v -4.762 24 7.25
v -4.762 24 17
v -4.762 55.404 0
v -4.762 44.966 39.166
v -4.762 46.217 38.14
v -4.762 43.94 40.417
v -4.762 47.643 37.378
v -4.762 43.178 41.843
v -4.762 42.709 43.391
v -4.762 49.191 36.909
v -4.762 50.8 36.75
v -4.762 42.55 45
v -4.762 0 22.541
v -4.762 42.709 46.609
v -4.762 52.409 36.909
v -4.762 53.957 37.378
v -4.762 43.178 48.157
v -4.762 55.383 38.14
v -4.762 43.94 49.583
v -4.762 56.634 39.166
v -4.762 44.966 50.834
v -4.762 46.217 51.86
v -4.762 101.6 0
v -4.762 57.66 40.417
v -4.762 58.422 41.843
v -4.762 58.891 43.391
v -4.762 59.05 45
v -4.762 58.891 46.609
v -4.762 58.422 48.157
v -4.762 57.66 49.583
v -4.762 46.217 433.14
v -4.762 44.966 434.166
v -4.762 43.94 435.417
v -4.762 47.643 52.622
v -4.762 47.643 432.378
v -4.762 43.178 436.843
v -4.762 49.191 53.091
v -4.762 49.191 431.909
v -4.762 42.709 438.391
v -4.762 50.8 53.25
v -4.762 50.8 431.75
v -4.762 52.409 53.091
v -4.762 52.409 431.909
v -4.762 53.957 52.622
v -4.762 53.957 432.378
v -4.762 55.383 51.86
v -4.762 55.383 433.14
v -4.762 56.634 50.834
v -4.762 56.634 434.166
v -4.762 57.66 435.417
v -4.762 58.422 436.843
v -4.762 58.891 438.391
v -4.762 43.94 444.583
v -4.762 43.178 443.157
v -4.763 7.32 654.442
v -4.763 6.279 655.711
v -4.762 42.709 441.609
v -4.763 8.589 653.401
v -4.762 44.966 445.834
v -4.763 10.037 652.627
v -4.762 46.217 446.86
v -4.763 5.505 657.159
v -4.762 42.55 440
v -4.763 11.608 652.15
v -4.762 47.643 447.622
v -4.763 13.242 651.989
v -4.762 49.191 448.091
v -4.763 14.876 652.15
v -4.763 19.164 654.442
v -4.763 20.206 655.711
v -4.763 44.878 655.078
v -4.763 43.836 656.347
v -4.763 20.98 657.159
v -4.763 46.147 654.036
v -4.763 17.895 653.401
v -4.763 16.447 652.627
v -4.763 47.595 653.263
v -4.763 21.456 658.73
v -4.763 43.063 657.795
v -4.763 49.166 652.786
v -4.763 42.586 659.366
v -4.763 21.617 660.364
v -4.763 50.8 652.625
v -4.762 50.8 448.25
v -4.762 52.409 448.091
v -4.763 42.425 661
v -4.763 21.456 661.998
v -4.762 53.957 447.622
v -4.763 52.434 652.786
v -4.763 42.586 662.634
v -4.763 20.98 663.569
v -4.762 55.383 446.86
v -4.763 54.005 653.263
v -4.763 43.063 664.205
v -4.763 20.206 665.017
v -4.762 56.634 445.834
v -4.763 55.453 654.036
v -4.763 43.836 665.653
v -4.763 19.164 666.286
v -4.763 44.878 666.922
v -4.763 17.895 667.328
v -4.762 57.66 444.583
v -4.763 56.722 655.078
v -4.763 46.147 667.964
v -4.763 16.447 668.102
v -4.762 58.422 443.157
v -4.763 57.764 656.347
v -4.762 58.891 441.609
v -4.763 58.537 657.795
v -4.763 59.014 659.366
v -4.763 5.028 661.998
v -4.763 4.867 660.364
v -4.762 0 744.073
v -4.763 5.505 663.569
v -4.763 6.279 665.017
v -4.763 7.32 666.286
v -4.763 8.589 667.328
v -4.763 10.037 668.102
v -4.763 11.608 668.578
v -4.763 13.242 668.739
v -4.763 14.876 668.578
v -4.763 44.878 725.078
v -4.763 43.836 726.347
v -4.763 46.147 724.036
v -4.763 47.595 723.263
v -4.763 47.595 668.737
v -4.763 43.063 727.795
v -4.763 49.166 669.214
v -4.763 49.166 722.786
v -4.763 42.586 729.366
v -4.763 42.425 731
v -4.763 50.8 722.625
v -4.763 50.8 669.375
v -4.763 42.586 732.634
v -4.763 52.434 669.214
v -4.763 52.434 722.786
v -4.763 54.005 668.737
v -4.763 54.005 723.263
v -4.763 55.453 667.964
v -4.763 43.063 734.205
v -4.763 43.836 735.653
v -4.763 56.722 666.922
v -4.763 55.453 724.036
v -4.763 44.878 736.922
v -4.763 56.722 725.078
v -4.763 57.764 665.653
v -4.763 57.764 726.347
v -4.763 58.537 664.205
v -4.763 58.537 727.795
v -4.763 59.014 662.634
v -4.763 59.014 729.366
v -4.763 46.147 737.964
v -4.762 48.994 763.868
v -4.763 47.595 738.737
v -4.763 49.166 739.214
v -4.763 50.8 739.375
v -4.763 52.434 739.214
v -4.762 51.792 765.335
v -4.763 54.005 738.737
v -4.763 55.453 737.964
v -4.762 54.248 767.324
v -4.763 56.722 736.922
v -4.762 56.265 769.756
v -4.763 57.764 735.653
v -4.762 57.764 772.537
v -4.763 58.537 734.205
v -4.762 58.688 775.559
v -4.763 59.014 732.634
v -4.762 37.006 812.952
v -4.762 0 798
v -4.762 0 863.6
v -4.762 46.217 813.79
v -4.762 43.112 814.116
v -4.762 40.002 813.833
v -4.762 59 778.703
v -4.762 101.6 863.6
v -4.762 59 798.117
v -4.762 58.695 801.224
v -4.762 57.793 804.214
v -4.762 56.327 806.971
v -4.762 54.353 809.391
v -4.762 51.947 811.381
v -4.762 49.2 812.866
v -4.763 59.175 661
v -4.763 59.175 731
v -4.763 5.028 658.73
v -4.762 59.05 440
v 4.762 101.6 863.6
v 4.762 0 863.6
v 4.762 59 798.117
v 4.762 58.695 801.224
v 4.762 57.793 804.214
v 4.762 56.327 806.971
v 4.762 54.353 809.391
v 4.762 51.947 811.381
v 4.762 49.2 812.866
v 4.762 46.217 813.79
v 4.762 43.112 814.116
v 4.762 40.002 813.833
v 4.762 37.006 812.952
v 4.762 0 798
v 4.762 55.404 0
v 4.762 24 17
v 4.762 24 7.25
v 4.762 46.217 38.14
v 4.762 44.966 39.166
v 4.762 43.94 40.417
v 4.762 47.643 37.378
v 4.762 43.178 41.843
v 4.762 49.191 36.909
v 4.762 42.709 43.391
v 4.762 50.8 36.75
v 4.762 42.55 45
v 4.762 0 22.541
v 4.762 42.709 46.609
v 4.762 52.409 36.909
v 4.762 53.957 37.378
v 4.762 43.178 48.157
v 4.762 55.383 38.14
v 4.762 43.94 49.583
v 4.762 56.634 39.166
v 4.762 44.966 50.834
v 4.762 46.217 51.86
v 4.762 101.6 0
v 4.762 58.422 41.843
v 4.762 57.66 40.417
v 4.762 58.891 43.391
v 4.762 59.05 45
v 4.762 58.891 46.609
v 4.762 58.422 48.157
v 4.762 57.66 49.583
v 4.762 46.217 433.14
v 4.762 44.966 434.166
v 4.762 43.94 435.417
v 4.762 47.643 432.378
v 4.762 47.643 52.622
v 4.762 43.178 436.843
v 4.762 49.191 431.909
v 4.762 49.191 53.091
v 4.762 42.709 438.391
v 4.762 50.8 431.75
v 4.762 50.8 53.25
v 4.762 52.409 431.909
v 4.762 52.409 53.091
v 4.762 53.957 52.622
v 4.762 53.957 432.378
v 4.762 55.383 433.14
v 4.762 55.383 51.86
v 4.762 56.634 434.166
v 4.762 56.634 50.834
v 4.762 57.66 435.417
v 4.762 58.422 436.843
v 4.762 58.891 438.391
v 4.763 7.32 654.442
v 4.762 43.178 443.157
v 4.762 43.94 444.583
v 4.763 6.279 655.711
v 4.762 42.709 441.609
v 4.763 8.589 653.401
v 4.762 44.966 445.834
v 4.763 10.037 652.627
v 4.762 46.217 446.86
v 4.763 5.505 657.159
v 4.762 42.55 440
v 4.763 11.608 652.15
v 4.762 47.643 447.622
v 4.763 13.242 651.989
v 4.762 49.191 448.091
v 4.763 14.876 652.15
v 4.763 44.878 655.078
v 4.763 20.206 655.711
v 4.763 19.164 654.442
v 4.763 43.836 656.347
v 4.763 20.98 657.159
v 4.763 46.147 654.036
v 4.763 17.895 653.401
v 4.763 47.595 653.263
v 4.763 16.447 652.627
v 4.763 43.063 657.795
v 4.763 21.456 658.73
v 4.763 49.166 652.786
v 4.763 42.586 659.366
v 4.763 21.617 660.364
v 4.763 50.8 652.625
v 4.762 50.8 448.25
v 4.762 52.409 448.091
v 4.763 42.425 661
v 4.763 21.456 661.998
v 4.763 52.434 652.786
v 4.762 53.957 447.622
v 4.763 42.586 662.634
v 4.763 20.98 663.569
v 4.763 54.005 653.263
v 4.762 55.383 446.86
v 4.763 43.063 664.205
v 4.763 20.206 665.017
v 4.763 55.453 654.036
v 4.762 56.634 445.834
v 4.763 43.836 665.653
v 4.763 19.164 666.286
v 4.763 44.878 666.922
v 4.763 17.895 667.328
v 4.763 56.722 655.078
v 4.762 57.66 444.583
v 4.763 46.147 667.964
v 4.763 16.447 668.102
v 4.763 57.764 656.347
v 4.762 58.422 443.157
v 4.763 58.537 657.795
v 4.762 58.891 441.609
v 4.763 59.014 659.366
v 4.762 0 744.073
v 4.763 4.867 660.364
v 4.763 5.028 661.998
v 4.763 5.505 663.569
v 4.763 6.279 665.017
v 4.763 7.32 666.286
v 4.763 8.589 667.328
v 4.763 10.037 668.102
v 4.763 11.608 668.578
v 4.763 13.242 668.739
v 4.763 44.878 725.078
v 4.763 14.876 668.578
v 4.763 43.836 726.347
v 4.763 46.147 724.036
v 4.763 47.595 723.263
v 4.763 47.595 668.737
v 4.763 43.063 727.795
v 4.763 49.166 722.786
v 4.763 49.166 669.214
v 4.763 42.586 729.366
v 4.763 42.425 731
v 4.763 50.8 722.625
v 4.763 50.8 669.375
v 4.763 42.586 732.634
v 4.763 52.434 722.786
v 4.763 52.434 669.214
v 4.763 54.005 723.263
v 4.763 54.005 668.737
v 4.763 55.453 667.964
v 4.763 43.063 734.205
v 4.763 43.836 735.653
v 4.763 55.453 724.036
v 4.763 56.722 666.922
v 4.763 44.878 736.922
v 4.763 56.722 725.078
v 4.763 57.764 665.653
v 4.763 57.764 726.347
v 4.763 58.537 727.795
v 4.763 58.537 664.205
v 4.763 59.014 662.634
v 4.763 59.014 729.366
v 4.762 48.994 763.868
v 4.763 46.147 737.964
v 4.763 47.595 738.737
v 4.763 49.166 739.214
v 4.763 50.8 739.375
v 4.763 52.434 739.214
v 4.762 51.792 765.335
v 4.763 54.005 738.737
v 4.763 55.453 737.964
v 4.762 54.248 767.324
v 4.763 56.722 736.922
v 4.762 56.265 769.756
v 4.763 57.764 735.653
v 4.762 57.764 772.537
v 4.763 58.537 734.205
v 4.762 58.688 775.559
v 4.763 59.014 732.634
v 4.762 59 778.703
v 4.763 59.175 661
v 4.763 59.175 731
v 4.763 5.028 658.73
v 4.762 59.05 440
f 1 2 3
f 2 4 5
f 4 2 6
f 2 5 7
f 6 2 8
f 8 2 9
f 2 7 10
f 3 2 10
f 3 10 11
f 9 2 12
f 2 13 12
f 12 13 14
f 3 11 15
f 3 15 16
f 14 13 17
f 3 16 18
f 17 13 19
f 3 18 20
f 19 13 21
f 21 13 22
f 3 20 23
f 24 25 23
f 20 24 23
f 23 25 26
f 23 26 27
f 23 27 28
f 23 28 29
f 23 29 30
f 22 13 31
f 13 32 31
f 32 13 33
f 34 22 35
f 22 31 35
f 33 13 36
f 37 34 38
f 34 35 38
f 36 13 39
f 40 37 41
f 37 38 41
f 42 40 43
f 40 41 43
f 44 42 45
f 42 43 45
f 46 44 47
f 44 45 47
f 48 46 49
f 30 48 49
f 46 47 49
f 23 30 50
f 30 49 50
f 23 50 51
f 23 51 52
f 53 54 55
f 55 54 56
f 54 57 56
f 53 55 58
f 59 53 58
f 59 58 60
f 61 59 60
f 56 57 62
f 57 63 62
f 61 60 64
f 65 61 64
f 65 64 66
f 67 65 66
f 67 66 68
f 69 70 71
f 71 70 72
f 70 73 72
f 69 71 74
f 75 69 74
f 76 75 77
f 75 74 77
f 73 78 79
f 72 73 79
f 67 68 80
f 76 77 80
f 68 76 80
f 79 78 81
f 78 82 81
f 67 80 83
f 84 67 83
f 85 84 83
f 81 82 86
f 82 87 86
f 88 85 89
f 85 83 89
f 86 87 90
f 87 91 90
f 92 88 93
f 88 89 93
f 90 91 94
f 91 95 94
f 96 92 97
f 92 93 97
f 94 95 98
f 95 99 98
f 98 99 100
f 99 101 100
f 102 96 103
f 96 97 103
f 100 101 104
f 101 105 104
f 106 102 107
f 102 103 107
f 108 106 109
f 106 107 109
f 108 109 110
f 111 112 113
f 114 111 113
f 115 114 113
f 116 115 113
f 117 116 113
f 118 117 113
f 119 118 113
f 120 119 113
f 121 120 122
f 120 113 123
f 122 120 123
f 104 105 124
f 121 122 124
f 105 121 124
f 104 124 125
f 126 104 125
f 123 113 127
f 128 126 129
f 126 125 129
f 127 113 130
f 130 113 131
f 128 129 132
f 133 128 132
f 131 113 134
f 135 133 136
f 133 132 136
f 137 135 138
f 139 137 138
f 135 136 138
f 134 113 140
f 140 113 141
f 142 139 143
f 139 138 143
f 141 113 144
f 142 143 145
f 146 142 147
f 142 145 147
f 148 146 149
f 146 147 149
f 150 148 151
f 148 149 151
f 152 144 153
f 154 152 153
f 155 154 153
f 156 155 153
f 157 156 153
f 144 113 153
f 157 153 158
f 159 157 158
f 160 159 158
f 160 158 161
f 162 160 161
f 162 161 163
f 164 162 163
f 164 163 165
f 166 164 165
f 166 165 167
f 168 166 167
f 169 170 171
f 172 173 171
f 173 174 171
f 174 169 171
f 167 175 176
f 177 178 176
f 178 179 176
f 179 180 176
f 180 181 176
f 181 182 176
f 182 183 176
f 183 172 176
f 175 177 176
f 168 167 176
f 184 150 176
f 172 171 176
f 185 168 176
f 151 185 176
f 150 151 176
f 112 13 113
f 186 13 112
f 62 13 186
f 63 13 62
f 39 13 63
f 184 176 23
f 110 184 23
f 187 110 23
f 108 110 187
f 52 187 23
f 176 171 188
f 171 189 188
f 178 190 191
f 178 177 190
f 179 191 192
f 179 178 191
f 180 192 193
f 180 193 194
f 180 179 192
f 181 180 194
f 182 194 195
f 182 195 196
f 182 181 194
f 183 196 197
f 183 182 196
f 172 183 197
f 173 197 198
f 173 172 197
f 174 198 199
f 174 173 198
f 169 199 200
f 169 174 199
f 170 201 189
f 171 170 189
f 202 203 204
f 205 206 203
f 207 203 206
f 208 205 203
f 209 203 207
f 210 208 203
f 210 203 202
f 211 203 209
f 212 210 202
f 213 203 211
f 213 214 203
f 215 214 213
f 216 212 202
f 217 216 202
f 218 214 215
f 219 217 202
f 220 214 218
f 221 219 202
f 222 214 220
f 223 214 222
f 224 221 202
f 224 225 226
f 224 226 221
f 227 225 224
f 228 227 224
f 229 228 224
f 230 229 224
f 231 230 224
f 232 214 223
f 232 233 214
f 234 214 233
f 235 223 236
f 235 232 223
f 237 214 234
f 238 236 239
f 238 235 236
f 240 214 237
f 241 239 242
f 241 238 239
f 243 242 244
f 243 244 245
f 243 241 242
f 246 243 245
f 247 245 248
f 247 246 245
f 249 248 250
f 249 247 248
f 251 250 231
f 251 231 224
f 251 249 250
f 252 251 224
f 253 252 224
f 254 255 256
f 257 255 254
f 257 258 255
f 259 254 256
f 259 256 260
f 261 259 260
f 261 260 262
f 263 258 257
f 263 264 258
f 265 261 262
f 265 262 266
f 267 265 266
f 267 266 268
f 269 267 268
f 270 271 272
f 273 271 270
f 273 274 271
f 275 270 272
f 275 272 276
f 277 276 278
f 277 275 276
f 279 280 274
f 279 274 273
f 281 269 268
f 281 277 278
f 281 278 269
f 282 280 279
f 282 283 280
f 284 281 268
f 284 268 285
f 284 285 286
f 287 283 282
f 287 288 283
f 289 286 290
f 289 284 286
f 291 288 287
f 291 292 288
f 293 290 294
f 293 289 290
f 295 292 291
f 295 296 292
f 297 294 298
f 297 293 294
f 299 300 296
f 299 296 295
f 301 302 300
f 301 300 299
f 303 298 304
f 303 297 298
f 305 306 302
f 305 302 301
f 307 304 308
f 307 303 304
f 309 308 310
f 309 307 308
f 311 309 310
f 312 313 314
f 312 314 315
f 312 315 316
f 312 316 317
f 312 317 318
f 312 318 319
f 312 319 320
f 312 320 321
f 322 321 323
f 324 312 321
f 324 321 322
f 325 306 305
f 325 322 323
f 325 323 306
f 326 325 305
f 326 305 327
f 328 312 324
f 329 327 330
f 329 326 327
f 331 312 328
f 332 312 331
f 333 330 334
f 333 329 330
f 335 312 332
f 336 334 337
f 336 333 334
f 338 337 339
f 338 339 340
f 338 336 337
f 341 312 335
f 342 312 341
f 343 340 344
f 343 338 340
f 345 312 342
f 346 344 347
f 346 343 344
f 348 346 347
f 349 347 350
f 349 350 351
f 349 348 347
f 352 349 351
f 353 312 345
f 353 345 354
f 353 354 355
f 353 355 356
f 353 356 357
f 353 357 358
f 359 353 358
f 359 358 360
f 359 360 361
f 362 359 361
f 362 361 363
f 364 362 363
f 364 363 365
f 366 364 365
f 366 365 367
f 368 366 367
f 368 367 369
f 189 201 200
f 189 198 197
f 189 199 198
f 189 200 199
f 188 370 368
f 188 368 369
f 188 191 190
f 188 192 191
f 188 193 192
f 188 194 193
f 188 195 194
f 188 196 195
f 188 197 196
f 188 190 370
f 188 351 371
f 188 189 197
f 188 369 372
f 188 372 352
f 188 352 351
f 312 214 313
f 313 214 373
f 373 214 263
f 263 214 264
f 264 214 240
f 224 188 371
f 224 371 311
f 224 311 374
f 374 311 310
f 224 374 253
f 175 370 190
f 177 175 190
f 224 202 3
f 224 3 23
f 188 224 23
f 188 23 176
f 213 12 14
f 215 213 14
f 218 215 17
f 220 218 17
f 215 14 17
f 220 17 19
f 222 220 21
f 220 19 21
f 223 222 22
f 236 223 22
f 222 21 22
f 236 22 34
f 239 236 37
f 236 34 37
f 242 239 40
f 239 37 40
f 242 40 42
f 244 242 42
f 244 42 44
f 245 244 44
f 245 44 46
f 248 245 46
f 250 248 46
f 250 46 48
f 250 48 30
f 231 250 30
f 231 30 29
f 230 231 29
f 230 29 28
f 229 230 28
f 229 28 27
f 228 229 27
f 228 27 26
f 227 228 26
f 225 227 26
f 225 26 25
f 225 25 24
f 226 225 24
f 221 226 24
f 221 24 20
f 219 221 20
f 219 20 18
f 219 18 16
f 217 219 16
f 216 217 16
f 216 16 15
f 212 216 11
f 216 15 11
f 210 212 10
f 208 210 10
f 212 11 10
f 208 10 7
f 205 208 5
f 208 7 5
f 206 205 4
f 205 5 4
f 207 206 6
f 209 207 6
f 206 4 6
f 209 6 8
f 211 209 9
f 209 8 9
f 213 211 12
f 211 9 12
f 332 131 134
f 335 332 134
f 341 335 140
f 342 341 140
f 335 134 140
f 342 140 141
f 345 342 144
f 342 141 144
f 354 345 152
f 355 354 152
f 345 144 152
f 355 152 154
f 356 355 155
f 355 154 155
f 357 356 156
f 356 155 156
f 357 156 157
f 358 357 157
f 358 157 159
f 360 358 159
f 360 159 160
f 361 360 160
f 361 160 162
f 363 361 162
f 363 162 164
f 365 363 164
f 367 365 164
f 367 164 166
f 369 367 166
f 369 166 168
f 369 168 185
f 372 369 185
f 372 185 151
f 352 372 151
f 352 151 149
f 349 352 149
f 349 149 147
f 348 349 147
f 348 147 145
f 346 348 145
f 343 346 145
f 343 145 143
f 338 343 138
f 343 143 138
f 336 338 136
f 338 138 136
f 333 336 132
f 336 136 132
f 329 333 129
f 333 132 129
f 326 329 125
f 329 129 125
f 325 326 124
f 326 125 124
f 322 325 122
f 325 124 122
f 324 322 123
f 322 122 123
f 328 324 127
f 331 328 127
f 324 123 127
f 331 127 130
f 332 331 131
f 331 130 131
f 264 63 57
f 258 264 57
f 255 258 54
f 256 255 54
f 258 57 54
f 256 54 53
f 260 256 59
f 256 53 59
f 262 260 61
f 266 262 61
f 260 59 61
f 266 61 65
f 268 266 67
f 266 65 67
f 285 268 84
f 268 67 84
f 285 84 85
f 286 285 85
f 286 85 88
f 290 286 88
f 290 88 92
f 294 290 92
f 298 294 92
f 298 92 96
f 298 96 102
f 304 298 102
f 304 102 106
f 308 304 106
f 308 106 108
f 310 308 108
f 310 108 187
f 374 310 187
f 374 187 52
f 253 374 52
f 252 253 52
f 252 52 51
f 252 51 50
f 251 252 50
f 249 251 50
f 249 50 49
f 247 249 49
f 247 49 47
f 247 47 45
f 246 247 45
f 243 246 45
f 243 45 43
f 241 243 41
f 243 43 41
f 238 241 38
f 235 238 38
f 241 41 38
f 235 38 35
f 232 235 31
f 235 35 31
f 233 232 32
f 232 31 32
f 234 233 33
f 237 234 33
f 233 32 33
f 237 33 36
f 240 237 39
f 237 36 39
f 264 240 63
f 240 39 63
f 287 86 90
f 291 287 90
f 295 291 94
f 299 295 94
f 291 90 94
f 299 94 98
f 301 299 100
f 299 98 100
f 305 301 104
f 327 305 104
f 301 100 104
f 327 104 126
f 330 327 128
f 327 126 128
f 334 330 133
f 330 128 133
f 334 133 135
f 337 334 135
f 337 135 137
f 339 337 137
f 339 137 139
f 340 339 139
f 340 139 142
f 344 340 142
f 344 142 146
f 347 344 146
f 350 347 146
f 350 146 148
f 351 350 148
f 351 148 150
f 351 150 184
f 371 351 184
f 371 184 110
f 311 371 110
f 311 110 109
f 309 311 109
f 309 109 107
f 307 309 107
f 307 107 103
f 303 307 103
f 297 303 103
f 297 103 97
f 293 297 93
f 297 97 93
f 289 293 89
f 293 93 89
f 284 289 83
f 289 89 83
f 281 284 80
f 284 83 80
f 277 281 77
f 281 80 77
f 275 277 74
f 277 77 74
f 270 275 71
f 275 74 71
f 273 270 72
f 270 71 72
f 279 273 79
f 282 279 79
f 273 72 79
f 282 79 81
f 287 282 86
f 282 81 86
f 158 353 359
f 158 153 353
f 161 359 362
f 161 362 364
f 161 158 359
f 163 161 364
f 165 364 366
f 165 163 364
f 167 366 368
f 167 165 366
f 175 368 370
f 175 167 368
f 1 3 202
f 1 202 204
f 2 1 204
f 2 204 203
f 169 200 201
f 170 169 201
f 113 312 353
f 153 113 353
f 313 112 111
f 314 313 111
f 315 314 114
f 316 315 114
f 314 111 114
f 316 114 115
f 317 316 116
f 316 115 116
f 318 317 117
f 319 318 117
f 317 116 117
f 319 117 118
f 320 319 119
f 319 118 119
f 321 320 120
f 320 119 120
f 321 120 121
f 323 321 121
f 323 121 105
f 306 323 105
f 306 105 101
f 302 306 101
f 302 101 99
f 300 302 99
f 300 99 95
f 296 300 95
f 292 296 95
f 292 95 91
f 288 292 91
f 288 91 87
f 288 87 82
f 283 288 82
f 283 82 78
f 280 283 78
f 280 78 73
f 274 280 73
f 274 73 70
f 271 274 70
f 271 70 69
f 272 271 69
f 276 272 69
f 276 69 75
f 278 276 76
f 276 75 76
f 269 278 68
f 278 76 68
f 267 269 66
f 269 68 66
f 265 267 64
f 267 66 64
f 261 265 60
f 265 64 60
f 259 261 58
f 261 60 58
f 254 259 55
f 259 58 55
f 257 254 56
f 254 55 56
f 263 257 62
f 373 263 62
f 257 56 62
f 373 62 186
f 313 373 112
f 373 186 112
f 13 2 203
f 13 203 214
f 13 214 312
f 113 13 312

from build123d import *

# Parameters (mm, degrees)
F0_W          = 101.6
F0_H          = 863.6
F1_DEPTH      = 4.7625
F2_R          = 8.25
F3_DEPTH      = 9.526
F5_DEPTH      = 9.526
F6_R          = 16
F8_DEPTH      = 4.7635
F8_DEPTH_BACK = 4.7635
F10_D         = 16.75


with BuildPart() as f1:
    # F0 (on Right) → F1 (new body, symmetric)
    with BuildSketch(Plane.YZ):
        with Locations((50.8, 431.8)):
            Rectangle(F0_W, F0_H)
    extrude(amount=F1_DEPTH, both=True)

    # F2 (on face) → F3 (cut, through all)
    with BuildSketch(Plane(origin=(-4.7625, 0, 0), x_dir=(0, -1, 0), z_dir=(-1, 0, 0))):
        with Locations((-50.8, 45)):
            Circle(F2_R)
        with Locations((-50.8, 440)):
            Circle(F2_R)
    extrude(amount=-F3_DEPTH, mode=Mode.SUBTRACT)

    # F4 (on face) → F5 (cut, through all)
    with BuildSketch(Plane.YZ.offset(4.7625)):
        Polygon((59, 821.8375473243), (0, 798), (0, 744.0732628661), (59, 767.9108101904), align=None)
    extrude(amount=-F5_DEPTH, mode=Mode.SUBTRACT)

    # F6
    f6_edges = [f1.edges().sort_by_distance(p)[0] for p in [
        (0, 59, 767.91081),
        (0, 59, 821.837547),
    ]]
    fillet(f6_edges, radius=F6_R)

    # F7 (on Right) → F8 (cut, two sides)
    with BuildSketch(Plane.YZ) as f8_sk:
        Polygon((0, 22.540836587), (0, 0), (55.4036807783, 0), (24, 7.250110976), (24, 17), align=None)
    extrude(amount=-F8_DEPTH, mode=Mode.SUBTRACT)
    extrude(f8_sk.sketch, amount=F8_DEPTH_BACK, mode=Mode.SUBTRACT)

    # F10 (through all)
    with Locations(Plane.YZ.offset(4.7625)):
        with Locations((50.8, 731), (50.8, 661), (13.2422749771, 660.3641925713)):
            Hole(F10_D / 2)


solid = f1.part
